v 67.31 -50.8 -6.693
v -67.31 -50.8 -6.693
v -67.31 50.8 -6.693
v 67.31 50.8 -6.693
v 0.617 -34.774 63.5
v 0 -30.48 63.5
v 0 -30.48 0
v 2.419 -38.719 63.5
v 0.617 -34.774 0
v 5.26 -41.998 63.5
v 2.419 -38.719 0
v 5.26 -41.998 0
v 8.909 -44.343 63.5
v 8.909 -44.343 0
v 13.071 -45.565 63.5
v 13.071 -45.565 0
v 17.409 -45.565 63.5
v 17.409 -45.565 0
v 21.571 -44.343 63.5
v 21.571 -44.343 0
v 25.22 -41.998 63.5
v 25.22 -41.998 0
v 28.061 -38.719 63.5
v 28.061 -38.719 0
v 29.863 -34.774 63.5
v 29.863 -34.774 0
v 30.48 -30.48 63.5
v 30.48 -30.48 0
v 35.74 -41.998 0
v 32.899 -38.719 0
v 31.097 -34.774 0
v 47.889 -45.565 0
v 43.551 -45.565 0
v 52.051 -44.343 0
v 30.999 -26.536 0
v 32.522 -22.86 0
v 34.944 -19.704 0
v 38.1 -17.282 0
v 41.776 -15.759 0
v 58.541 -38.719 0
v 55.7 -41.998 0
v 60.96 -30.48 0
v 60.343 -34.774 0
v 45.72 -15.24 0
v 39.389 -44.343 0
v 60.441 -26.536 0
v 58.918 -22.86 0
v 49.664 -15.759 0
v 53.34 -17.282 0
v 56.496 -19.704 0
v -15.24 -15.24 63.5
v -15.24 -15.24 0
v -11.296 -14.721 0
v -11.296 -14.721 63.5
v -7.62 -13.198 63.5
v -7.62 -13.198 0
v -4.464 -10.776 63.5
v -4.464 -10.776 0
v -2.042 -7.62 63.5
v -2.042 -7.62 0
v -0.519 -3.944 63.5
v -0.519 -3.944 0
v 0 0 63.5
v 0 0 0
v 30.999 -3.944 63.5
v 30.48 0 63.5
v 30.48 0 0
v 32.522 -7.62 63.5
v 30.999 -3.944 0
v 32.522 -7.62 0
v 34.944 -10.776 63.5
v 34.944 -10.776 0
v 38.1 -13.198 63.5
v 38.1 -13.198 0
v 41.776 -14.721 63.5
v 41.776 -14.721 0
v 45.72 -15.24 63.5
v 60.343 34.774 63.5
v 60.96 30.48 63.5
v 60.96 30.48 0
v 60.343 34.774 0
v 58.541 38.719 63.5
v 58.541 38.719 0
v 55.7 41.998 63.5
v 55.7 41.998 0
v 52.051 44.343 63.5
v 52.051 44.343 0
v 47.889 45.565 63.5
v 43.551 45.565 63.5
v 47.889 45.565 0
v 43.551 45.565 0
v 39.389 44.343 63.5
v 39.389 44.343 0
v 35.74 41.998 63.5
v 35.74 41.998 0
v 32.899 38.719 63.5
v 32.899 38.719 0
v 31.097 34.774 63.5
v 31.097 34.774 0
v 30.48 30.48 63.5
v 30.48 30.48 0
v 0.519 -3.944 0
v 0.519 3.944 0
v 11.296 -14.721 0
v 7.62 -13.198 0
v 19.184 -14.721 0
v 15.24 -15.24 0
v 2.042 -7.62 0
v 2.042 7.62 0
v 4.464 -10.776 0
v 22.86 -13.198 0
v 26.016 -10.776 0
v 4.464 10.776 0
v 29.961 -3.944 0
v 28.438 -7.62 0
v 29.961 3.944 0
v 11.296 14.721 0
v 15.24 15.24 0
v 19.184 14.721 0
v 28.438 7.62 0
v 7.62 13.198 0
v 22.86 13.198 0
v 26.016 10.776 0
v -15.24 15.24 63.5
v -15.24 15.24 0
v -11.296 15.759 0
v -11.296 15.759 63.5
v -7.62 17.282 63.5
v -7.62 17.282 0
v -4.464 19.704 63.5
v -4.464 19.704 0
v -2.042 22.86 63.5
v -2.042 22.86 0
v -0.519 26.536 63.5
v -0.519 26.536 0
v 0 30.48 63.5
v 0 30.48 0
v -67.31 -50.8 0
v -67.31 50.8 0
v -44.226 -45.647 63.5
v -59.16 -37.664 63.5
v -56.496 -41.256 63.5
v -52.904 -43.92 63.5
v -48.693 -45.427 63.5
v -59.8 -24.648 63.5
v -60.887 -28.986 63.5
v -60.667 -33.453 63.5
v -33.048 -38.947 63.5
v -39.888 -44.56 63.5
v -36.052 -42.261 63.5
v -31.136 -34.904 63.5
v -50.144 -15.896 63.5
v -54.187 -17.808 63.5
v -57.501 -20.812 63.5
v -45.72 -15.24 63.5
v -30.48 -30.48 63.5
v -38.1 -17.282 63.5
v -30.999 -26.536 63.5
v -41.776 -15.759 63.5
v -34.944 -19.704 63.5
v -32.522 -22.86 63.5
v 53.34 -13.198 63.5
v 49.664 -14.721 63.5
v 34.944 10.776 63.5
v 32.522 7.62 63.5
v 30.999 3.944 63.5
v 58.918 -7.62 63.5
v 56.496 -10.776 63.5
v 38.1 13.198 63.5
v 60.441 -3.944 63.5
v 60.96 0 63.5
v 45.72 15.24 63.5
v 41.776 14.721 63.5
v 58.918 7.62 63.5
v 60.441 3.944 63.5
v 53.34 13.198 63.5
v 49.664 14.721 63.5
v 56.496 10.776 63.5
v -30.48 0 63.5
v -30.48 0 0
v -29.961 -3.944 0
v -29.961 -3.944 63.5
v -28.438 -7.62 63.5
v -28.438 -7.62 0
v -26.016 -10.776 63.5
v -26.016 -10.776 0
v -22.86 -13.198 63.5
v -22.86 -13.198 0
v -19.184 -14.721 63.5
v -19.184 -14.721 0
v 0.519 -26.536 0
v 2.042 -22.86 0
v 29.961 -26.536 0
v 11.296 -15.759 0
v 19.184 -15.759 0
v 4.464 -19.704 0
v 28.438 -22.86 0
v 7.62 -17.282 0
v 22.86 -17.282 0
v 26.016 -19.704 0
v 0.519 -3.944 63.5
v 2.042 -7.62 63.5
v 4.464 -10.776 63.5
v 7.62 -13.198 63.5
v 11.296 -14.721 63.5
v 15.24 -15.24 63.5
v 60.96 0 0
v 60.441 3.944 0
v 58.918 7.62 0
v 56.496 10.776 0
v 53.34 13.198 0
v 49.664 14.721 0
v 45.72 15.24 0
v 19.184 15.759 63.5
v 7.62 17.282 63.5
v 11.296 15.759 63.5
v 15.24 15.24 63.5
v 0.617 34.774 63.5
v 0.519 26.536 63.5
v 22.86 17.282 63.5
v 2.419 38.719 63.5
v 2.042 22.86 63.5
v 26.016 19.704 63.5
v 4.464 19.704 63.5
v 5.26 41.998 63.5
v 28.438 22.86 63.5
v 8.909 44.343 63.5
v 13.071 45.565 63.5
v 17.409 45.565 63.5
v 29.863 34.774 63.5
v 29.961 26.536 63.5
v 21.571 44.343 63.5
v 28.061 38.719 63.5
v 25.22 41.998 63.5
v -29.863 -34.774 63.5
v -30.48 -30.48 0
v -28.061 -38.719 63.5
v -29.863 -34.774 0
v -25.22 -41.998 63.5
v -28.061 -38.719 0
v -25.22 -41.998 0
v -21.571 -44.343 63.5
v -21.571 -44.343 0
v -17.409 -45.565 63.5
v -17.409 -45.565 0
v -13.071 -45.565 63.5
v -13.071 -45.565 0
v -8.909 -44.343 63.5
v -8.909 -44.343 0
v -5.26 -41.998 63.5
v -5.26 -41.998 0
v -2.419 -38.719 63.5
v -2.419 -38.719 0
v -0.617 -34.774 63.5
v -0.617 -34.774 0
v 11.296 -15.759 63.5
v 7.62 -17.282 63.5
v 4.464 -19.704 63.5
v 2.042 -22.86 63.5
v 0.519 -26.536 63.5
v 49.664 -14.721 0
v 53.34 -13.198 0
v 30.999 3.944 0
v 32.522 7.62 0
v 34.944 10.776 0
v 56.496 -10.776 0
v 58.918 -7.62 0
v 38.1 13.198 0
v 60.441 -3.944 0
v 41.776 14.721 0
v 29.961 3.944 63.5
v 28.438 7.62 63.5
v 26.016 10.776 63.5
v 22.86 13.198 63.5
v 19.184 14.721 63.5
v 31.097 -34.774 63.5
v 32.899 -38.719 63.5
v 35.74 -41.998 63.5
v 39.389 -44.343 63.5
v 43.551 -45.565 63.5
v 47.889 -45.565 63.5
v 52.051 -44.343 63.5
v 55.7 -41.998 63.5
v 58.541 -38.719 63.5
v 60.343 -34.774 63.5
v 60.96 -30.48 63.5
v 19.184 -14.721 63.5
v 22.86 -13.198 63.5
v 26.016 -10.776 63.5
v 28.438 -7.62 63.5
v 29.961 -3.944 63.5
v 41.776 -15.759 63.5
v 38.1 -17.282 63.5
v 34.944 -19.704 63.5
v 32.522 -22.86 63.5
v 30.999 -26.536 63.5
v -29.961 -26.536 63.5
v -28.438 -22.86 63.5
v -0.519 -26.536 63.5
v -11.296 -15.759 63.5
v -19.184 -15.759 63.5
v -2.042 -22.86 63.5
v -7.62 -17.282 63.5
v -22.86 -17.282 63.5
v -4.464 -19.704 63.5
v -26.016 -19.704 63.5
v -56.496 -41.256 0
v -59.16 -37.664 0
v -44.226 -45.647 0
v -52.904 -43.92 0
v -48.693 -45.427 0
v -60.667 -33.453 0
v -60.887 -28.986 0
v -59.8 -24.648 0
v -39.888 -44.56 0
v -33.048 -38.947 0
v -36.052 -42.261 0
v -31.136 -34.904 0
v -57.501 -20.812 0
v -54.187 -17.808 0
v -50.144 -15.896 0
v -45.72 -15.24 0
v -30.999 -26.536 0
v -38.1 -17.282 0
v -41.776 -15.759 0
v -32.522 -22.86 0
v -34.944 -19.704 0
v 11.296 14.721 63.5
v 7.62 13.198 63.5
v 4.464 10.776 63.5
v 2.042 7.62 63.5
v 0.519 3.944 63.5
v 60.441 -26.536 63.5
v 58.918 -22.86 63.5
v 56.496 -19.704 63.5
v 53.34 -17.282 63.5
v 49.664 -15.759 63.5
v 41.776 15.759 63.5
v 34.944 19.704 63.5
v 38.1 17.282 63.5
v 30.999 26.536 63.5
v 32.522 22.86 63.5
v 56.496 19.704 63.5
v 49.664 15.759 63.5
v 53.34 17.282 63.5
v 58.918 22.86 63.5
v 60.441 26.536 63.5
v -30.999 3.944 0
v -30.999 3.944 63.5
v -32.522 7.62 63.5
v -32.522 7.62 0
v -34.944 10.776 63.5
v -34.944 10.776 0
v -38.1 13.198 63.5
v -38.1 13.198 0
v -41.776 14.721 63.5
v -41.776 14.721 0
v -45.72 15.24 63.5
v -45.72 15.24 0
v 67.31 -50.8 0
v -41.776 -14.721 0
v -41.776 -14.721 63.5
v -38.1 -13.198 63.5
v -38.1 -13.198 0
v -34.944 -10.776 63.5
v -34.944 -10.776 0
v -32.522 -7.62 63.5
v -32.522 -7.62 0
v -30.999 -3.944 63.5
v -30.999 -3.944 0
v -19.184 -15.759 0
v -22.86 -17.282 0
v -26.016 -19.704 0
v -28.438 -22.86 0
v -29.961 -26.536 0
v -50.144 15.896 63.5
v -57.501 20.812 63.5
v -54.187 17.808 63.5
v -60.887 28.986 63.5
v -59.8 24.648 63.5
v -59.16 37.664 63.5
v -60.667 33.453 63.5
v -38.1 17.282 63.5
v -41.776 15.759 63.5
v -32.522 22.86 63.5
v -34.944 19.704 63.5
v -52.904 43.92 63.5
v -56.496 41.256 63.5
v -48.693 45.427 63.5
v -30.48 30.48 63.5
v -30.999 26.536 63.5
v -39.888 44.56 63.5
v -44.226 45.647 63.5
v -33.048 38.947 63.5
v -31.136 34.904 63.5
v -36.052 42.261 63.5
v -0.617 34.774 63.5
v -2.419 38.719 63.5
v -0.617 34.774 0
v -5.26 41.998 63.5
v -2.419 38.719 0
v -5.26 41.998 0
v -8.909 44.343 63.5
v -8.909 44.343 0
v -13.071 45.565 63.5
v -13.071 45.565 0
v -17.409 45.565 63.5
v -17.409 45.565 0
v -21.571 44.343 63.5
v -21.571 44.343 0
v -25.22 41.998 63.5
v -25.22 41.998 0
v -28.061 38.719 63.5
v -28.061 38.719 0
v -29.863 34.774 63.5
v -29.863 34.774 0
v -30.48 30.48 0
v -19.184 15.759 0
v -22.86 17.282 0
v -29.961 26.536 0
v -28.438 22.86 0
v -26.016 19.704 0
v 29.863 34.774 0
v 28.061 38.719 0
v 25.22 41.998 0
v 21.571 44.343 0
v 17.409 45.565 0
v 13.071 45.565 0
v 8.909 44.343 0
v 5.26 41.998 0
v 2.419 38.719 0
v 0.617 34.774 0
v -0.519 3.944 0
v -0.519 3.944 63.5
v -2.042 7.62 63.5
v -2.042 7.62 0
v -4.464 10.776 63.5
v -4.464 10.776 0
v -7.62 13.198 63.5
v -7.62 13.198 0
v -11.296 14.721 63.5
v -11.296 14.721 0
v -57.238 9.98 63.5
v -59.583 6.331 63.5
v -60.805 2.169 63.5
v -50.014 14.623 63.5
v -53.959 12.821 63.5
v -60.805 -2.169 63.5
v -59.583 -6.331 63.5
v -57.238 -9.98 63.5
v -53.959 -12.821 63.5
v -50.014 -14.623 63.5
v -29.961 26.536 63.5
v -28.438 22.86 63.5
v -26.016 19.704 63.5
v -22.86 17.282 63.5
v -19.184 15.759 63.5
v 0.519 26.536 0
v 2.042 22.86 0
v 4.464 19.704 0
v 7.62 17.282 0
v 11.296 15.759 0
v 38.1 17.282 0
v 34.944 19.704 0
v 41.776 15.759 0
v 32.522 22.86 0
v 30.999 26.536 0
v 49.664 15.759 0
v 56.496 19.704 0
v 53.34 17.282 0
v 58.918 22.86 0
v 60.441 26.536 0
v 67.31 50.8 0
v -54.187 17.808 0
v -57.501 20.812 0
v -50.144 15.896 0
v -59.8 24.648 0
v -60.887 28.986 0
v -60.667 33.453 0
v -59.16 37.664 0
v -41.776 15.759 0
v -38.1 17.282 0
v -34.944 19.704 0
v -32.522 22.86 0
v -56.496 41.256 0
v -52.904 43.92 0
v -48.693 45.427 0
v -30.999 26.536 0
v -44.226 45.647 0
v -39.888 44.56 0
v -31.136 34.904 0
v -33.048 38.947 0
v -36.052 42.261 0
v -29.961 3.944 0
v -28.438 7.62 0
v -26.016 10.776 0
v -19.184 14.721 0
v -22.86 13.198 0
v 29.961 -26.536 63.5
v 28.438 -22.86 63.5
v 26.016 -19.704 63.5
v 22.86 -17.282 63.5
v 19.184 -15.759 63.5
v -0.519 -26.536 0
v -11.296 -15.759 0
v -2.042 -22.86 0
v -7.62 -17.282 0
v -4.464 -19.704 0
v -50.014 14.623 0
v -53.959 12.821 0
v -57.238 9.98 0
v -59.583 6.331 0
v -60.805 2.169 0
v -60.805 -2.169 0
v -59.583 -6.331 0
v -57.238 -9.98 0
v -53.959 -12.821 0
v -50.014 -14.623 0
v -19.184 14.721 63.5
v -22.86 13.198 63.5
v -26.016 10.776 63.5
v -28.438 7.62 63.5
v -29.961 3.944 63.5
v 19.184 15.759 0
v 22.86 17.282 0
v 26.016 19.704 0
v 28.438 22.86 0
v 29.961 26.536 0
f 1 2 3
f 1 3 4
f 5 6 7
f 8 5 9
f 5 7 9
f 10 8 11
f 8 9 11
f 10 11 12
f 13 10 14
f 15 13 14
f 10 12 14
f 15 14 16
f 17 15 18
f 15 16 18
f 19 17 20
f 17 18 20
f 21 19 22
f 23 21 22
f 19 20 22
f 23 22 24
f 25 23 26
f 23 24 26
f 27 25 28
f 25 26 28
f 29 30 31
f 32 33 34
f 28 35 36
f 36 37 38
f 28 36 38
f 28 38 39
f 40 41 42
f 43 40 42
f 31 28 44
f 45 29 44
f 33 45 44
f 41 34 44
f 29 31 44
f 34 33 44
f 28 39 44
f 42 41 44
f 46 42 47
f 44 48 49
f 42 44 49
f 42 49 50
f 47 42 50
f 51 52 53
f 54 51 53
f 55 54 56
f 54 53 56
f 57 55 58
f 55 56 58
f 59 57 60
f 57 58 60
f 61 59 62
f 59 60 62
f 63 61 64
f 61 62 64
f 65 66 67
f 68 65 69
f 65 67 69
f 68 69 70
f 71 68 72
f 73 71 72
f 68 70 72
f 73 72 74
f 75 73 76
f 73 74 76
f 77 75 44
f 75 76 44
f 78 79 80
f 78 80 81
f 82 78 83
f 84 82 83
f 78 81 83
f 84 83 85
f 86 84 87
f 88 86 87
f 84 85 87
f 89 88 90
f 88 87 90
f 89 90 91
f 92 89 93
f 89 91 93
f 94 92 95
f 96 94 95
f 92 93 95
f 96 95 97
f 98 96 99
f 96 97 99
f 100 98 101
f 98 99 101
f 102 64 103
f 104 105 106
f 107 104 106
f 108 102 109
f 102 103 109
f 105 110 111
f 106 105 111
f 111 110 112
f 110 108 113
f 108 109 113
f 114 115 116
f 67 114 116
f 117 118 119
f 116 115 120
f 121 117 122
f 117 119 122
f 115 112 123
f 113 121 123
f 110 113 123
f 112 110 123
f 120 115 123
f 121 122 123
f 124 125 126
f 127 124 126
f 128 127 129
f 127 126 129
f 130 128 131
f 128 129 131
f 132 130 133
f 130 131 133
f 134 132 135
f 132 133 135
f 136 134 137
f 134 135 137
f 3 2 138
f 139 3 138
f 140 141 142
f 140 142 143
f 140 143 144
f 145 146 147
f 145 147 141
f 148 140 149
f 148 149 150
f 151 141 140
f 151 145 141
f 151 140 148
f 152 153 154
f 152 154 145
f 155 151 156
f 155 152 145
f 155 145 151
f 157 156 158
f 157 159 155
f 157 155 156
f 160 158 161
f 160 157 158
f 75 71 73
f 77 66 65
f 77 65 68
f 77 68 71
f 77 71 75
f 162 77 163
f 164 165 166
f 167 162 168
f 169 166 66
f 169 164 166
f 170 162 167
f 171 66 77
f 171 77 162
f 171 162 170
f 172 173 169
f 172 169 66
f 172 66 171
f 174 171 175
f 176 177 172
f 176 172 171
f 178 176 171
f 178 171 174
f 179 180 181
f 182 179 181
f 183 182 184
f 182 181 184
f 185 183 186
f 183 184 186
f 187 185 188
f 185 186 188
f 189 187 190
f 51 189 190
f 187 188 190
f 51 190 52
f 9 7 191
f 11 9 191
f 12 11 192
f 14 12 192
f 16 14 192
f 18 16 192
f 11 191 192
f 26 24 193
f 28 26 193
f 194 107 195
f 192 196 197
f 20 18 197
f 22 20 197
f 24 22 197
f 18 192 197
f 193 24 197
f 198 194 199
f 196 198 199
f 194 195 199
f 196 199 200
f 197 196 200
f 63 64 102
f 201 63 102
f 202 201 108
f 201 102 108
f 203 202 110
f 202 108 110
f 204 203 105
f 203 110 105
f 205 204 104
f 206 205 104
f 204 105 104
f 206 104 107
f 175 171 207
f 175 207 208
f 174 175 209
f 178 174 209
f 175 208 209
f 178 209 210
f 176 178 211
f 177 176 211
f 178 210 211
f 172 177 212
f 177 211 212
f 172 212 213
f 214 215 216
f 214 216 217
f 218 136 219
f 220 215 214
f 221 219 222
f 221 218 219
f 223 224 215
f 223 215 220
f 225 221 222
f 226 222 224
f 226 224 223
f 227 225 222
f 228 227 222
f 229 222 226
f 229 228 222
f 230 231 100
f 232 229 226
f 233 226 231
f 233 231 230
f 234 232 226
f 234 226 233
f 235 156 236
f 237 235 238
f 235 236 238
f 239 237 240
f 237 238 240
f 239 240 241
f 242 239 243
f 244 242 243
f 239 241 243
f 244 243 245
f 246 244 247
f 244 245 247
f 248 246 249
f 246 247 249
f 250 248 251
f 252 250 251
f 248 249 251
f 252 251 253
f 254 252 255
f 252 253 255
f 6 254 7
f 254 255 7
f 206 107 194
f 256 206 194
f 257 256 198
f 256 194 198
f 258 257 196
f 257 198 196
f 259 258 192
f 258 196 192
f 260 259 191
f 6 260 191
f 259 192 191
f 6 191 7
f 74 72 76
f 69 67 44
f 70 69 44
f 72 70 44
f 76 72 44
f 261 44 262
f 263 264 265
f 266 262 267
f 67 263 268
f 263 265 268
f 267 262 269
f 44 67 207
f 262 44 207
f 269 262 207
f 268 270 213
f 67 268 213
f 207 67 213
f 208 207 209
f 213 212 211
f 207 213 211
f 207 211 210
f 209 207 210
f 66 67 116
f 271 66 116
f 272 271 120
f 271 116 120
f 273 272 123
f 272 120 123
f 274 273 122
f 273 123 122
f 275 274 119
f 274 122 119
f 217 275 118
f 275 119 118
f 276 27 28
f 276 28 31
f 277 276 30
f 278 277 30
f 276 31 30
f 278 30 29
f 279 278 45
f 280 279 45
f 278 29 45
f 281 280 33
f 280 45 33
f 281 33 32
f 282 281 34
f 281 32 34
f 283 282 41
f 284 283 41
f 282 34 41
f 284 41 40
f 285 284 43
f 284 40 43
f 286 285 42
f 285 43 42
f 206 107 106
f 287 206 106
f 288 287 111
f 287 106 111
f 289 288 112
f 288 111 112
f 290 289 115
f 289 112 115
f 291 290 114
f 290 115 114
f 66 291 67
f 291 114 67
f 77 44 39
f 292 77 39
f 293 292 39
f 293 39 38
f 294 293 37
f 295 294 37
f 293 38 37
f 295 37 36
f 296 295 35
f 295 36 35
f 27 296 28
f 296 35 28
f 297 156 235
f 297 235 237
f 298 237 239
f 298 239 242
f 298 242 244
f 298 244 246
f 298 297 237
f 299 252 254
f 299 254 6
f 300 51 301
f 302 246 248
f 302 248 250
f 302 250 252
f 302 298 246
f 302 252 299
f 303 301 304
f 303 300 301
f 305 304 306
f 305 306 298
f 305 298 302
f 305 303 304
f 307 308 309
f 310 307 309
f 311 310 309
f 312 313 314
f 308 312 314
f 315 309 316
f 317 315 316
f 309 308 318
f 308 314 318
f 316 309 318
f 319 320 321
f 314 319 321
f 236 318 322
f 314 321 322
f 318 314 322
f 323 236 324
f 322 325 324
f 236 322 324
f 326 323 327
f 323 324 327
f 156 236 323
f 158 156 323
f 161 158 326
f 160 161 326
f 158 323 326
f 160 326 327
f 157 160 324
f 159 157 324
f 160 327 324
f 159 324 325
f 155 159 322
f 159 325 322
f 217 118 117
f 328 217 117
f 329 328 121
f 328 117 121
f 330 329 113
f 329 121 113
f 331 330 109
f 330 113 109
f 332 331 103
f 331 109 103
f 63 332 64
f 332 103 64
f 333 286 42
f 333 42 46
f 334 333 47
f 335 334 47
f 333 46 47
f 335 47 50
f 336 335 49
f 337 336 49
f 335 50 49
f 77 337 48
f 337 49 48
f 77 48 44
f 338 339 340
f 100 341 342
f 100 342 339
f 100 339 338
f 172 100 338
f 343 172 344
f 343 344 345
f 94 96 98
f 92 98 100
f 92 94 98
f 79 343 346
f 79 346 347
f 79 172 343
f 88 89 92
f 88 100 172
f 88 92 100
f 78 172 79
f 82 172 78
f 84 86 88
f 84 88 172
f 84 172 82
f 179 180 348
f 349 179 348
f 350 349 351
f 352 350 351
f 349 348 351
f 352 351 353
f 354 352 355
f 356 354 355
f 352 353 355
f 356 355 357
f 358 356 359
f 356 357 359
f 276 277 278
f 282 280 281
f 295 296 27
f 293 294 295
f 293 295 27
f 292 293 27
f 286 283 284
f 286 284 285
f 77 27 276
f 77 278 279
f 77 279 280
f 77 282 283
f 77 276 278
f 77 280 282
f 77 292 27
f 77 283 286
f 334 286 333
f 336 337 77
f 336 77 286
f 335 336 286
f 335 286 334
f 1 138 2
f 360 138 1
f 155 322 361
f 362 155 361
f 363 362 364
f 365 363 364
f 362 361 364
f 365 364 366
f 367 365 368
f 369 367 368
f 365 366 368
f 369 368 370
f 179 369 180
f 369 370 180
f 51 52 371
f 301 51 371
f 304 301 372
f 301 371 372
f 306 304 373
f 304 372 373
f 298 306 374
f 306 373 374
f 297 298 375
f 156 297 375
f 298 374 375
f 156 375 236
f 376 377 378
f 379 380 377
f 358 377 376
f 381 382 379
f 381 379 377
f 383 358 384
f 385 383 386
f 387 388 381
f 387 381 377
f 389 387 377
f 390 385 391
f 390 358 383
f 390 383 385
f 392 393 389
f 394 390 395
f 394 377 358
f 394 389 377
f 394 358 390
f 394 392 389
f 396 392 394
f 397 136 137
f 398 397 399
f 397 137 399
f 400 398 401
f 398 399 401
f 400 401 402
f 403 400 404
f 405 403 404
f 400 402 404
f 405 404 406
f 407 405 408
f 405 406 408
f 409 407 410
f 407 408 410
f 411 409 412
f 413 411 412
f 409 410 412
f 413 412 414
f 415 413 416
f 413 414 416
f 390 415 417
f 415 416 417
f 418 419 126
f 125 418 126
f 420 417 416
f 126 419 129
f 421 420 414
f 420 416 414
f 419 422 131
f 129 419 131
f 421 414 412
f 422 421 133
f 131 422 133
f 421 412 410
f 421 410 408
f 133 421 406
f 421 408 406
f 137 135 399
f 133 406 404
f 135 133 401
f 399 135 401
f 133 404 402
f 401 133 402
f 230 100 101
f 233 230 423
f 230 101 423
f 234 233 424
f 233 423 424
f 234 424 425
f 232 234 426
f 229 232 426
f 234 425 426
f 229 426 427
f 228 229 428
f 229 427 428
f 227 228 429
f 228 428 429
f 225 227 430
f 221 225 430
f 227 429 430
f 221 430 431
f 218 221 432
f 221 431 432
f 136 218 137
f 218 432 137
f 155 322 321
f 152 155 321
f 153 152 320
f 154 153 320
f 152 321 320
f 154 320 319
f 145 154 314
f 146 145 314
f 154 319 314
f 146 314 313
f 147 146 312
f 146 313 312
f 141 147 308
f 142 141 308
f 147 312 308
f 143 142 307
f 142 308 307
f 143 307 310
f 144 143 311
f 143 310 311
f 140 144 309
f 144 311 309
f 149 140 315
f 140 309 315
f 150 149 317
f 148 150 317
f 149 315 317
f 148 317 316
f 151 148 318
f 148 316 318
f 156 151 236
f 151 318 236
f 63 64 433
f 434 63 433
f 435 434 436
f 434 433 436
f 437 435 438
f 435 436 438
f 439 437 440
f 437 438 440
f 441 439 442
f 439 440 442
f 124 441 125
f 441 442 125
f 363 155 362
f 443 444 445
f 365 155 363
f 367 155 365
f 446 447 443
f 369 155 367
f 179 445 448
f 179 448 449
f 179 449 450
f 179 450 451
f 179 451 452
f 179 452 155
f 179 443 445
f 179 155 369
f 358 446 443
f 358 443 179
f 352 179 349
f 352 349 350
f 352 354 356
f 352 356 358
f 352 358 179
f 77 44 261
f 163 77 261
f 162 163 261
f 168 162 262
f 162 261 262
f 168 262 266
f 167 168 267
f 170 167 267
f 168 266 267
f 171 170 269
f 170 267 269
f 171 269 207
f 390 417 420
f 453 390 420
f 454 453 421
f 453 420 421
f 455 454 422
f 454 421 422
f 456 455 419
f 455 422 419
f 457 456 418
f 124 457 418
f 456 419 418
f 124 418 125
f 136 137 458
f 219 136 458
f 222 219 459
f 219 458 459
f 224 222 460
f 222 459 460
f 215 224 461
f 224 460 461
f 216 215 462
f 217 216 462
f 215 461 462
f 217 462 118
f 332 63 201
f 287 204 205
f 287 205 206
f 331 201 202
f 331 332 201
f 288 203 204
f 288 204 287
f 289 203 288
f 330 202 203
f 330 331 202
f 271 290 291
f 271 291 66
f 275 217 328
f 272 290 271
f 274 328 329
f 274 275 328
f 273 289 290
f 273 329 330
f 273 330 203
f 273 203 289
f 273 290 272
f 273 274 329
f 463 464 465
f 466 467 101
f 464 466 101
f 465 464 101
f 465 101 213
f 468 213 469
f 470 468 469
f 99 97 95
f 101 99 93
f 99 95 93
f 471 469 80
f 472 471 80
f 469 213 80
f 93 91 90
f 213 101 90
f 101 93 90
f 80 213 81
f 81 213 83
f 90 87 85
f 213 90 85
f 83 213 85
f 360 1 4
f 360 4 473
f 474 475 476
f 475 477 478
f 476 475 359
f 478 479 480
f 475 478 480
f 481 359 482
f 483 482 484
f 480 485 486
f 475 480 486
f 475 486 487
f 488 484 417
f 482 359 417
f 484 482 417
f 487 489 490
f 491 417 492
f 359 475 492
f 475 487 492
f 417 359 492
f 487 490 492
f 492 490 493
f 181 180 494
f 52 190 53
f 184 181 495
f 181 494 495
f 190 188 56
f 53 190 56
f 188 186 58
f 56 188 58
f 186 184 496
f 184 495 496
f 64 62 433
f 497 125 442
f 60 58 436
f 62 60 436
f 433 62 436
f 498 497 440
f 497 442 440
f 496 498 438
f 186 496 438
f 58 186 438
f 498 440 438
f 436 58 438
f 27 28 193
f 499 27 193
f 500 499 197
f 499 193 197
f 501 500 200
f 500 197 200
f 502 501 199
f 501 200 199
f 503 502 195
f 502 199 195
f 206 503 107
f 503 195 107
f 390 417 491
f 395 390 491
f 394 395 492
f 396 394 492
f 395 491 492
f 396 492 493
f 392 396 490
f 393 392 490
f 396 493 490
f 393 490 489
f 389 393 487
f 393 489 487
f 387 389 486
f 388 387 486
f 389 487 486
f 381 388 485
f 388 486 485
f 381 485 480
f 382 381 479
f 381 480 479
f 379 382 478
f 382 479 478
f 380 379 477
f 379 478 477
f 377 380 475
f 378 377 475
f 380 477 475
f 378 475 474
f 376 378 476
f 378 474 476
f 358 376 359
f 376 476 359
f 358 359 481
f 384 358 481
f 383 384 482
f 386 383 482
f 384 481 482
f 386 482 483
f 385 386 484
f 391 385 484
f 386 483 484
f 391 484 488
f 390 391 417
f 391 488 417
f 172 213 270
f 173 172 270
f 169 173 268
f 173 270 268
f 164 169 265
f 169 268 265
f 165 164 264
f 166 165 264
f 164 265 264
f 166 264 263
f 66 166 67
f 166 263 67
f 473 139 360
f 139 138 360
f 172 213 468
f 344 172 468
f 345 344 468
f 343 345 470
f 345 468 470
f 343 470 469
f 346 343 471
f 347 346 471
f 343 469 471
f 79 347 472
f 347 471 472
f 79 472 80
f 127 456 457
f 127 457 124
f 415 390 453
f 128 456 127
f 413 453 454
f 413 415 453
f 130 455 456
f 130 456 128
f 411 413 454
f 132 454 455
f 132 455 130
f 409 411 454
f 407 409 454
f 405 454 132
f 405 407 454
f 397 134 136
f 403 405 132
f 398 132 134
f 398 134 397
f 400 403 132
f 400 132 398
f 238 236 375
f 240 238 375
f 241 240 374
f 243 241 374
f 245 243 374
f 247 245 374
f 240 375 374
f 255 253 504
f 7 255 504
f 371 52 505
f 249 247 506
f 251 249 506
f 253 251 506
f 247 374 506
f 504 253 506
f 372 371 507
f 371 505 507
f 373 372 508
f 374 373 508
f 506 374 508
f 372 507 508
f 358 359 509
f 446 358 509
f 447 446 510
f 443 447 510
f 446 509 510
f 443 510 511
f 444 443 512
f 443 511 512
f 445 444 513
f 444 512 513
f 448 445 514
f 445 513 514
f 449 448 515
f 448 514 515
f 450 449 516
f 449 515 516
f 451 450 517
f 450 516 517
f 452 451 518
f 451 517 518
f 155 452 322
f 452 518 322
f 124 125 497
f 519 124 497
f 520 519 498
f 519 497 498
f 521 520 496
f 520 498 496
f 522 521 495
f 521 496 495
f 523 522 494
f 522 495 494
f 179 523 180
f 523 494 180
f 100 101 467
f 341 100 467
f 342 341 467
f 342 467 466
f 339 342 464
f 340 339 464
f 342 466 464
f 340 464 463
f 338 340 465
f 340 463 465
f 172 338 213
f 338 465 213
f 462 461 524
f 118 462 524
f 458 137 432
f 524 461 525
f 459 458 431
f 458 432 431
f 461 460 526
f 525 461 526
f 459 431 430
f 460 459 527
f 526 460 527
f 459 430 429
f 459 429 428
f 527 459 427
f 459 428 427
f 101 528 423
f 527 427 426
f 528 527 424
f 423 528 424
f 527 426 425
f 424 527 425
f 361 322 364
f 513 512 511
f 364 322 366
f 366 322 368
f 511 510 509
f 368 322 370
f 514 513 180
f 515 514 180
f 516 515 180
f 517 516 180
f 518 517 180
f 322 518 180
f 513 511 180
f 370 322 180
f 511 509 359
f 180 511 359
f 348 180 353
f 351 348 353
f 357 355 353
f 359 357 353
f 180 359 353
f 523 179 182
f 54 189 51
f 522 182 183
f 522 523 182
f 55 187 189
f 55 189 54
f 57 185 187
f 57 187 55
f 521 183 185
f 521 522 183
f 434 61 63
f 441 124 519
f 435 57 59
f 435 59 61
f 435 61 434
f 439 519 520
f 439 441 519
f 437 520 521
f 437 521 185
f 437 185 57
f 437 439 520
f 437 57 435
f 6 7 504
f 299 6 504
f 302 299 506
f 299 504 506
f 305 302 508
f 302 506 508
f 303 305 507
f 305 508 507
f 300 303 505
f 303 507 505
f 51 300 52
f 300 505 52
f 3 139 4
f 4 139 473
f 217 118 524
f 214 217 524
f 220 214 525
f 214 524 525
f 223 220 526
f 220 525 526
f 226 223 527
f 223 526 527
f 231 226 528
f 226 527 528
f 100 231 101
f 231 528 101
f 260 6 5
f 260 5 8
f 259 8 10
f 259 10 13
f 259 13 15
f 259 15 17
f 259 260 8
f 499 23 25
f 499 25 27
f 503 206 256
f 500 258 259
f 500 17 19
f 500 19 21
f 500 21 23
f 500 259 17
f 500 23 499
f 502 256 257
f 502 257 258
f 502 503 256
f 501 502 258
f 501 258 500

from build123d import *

# Parameters (mm, degrees)
F1_DEPTH = 63.5
F2_W     = 134.62
F2_H     = 6.6927933697
F3_DEPTH = 50.8


# Not quite as in the source:
# - a feature names something its author has since deleted; it is built from what else it names


with BuildPart() as f1:
    # F0 (on Top) → F1 (new body)
    with BuildSketch(Plane.XY):
        with BuildLine():
            ThreePointArc((-45.72, -15.24), (-56.4963073453, -41.2563073453), (-30.48, -30.48))
            ThreePointArc((-30.48, -30.48), (-34.9436926547, -19.7036926547), (-45.72, -15.24))
        make_face()
    extrude(amount=F1_DEPTH)


with BuildPart() as f1b:
    # F0 (on Top) → F1, piece 2 (new body)
    with BuildSketch(Plane.XY):
        with BuildLine():
            ThreePointArc((-15.2399999801, -15.24), (-26.0163073382, -19.7036926477), (-30.48, -30.48))
            ThreePointArc((-30.48, -30.48), (-15.24, -45.72), (0, -30.48))
            ThreePointArc((0, -30.48), (-4.4636926477, -19.7036926618), (-15.2399999801, -15.24))
        make_face()
    extrude(amount=F1_DEPTH)


with BuildPart() as f1c:
    # F0 (on Top) → F1, piece 3 (new body)
    with BuildSketch(Plane.XY):
        with BuildLine():
            ThreePointArc((-45.72, 15.24), (-60.96, 0), (-45.72, -15.24))
            ThreePointArc((-45.72, -15.24), (-34.9436926547, -10.7763073453), (-30.48, 0))
            ThreePointArc((-30.48, 0), (-34.9436926547, 10.7763073453), (-45.72, 15.24))
        make_face()
    extrude(amount=F1_DEPTH)


with BuildPart() as f1d:
    # F0 (on Top) → F1, piece 4 (new body)
    with BuildSketch(Plane.XY):
        with BuildLine():
            ThreePointArc((15.2400000199, -15.24), (4.4636926618, -19.7036926477), (0, -30.48))
            ThreePointArc((0, -30.48), (15.24, -45.72), (30.48, -30.48))
            ThreePointArc((30.48, -30.48), (26.0163073523, -19.7036926618), (15.2400000199, -15.24))
        make_face()
    extrude(amount=F1_DEPTH)


with BuildPart() as f1e:
    # F0 (on Top) → F1, piece 5 (new body)
    with BuildSketch(Plane.XY):
        with BuildLine():
            ThreePointArc((-30.48, 0), (-26.0163073382, -10.7763073523), (-15.2399999801, -15.24))
            ThreePointArc((-15.2399999801, -15.24), (-4.4636926477, -10.7763073382), (0, 0))
            ThreePointArc((0, 0), (-4.4636926477, 10.7763073382), (-15.2399999801, 15.24))
            ThreePointArc((-15.2399999801, 15.24), (-26.0163073382, 10.7763073523), (-30.48, 0))
        make_face()
    extrude(amount=F1_DEPTH)


with BuildPart() as f1f:
    # F0 (on Top) → F1, piece 6 (new body)
    with BuildSketch(Plane.XY):
        with BuildLine():
            ThreePointArc((-30.48, 30.48), (-56.4963073453, 41.2563073453), (-45.72, 15.24))
            ThreePointArc((-45.72, 15.24), (-34.9436926547, 19.7036926547), (-30.48, 30.48))
        make_face()
    extrude(amount=F1_DEPTH)


with BuildPart() as f1g:
    # F0 (on Top) → F1, piece 7 (new body)
    with BuildSketch(Plane.XY):
        with BuildLine():
            ThreePointArc((45.7200000919, -15.24), (34.9436926872, -19.7036926222), (30.48, -30.48))
            ThreePointArc((30.48, -30.48), (45.72, -45.72), (60.96, -30.48))
            ThreePointArc((60.96, -30.48), (56.4963073778, -19.7036926872), (45.7200000919, -15.24))
        make_face()
    extrude(amount=F1_DEPTH)


with BuildPart() as f1h:
    # F0 (on Top) → F1, piece 8 (new body)
    with BuildSketch(Plane.XY):
        with BuildLine():
            ThreePointArc((0, 0), (4.4636926618, -10.7763073523), (15.2400000199, -15.24))
            ThreePointArc((15.2400000199, -15.24), (26.0163073523, -10.7763073382), (30.48, 0))
            ThreePointArc((30.48, 0), (26.0163073523, 10.7763073382), (15.2400000199, 15.24))
            ThreePointArc((15.2400000199, 15.24), (4.4636926618, 10.7763073523), (0, 0))
        make_face()
    extrude(amount=F1_DEPTH)


with BuildPart() as f1i:
    # F0 (on Top) → F1, piece 9 (new body)
    with BuildSketch(Plane.XY):
        with BuildLine():
            ThreePointArc((0, 30.48), (-15.24, 45.72), (-30.48, 30.48))
            ThreePointArc((-30.48, 30.48), (-26.0163073382, 19.7036926477), (-15.2399999801, 15.24))
            ThreePointArc((-15.2399999801, 15.24), (-4.4636926477, 19.7036926618), (0, 30.48))
        make_face()
    extrude(amount=F1_DEPTH)


with BuildPart() as f1j:
    # F0 (on Top) → F1, piece 10 (new body)
    with BuildSketch(Plane.XY):
        with BuildLine():
            ThreePointArc((30.48, 0), (34.9436926872, -10.7763073778), (45.7200000919, -15.24))
            ThreePointArc((45.7200000919, -15.24), (56.4963073778, -10.7763073128), (60.96, 0))
            ThreePointArc((60.96, 0), (56.4963073778, 10.7763073128), (45.7200000919, 15.24))
            ThreePointArc((45.7200000919, 15.24), (34.9436926872, 10.7763073778), (30.48, 0))
        make_face()
    extrude(amount=F1_DEPTH)


with BuildPart() as f1k:
    # F0 (on Top) → F1, piece 11 (new body)
    with BuildSketch(Plane.XY):
        with BuildLine():
            ThreePointArc((0, 30.48), (4.4636926618, 19.7036926477), (15.2400000199, 15.24))
            ThreePointArc((15.2400000199, 15.24), (26.0163073523, 19.7036926618), (30.48, 30.48))
            ThreePointArc((30.48, 30.48), (15.24, 45.72), (0, 30.48))
        make_face()
    extrude(amount=F1_DEPTH)


with BuildPart() as f1l:
    # F0 (on Top) → F1, piece 12 (new body)
    with BuildSketch(Plane.XY):
        with BuildLine():
            ThreePointArc((30.48, 30.48), (34.9436926872, 19.7036926222), (45.7200000919, 15.24))
            ThreePointArc((45.7200000919, 15.24), (56.4963073778, 19.7036926872), (60.96, 30.48))
            ThreePointArc((60.96, 30.48), (45.72, 45.72), (30.48, 30.48))
        make_face()
    extrude(amount=F1_DEPTH)


with BuildPart() as f3:
    # F2 (on Front) → F3 (new body, symmetric)
    with BuildSketch(Plane.XZ):
        with Locations((0, -3.3463966849)):
            Rectangle(F2_W, F2_H)
    extrude(amount=F3_DEPTH, both=True)


solid = Compound([f1.part, f1b.part, f1c.part, f1d.part, f1e.part, f1f.part, f1g.part, f1h.part, f1i.part, f1j.part, f1k.part, f1l.part, f3.part])
